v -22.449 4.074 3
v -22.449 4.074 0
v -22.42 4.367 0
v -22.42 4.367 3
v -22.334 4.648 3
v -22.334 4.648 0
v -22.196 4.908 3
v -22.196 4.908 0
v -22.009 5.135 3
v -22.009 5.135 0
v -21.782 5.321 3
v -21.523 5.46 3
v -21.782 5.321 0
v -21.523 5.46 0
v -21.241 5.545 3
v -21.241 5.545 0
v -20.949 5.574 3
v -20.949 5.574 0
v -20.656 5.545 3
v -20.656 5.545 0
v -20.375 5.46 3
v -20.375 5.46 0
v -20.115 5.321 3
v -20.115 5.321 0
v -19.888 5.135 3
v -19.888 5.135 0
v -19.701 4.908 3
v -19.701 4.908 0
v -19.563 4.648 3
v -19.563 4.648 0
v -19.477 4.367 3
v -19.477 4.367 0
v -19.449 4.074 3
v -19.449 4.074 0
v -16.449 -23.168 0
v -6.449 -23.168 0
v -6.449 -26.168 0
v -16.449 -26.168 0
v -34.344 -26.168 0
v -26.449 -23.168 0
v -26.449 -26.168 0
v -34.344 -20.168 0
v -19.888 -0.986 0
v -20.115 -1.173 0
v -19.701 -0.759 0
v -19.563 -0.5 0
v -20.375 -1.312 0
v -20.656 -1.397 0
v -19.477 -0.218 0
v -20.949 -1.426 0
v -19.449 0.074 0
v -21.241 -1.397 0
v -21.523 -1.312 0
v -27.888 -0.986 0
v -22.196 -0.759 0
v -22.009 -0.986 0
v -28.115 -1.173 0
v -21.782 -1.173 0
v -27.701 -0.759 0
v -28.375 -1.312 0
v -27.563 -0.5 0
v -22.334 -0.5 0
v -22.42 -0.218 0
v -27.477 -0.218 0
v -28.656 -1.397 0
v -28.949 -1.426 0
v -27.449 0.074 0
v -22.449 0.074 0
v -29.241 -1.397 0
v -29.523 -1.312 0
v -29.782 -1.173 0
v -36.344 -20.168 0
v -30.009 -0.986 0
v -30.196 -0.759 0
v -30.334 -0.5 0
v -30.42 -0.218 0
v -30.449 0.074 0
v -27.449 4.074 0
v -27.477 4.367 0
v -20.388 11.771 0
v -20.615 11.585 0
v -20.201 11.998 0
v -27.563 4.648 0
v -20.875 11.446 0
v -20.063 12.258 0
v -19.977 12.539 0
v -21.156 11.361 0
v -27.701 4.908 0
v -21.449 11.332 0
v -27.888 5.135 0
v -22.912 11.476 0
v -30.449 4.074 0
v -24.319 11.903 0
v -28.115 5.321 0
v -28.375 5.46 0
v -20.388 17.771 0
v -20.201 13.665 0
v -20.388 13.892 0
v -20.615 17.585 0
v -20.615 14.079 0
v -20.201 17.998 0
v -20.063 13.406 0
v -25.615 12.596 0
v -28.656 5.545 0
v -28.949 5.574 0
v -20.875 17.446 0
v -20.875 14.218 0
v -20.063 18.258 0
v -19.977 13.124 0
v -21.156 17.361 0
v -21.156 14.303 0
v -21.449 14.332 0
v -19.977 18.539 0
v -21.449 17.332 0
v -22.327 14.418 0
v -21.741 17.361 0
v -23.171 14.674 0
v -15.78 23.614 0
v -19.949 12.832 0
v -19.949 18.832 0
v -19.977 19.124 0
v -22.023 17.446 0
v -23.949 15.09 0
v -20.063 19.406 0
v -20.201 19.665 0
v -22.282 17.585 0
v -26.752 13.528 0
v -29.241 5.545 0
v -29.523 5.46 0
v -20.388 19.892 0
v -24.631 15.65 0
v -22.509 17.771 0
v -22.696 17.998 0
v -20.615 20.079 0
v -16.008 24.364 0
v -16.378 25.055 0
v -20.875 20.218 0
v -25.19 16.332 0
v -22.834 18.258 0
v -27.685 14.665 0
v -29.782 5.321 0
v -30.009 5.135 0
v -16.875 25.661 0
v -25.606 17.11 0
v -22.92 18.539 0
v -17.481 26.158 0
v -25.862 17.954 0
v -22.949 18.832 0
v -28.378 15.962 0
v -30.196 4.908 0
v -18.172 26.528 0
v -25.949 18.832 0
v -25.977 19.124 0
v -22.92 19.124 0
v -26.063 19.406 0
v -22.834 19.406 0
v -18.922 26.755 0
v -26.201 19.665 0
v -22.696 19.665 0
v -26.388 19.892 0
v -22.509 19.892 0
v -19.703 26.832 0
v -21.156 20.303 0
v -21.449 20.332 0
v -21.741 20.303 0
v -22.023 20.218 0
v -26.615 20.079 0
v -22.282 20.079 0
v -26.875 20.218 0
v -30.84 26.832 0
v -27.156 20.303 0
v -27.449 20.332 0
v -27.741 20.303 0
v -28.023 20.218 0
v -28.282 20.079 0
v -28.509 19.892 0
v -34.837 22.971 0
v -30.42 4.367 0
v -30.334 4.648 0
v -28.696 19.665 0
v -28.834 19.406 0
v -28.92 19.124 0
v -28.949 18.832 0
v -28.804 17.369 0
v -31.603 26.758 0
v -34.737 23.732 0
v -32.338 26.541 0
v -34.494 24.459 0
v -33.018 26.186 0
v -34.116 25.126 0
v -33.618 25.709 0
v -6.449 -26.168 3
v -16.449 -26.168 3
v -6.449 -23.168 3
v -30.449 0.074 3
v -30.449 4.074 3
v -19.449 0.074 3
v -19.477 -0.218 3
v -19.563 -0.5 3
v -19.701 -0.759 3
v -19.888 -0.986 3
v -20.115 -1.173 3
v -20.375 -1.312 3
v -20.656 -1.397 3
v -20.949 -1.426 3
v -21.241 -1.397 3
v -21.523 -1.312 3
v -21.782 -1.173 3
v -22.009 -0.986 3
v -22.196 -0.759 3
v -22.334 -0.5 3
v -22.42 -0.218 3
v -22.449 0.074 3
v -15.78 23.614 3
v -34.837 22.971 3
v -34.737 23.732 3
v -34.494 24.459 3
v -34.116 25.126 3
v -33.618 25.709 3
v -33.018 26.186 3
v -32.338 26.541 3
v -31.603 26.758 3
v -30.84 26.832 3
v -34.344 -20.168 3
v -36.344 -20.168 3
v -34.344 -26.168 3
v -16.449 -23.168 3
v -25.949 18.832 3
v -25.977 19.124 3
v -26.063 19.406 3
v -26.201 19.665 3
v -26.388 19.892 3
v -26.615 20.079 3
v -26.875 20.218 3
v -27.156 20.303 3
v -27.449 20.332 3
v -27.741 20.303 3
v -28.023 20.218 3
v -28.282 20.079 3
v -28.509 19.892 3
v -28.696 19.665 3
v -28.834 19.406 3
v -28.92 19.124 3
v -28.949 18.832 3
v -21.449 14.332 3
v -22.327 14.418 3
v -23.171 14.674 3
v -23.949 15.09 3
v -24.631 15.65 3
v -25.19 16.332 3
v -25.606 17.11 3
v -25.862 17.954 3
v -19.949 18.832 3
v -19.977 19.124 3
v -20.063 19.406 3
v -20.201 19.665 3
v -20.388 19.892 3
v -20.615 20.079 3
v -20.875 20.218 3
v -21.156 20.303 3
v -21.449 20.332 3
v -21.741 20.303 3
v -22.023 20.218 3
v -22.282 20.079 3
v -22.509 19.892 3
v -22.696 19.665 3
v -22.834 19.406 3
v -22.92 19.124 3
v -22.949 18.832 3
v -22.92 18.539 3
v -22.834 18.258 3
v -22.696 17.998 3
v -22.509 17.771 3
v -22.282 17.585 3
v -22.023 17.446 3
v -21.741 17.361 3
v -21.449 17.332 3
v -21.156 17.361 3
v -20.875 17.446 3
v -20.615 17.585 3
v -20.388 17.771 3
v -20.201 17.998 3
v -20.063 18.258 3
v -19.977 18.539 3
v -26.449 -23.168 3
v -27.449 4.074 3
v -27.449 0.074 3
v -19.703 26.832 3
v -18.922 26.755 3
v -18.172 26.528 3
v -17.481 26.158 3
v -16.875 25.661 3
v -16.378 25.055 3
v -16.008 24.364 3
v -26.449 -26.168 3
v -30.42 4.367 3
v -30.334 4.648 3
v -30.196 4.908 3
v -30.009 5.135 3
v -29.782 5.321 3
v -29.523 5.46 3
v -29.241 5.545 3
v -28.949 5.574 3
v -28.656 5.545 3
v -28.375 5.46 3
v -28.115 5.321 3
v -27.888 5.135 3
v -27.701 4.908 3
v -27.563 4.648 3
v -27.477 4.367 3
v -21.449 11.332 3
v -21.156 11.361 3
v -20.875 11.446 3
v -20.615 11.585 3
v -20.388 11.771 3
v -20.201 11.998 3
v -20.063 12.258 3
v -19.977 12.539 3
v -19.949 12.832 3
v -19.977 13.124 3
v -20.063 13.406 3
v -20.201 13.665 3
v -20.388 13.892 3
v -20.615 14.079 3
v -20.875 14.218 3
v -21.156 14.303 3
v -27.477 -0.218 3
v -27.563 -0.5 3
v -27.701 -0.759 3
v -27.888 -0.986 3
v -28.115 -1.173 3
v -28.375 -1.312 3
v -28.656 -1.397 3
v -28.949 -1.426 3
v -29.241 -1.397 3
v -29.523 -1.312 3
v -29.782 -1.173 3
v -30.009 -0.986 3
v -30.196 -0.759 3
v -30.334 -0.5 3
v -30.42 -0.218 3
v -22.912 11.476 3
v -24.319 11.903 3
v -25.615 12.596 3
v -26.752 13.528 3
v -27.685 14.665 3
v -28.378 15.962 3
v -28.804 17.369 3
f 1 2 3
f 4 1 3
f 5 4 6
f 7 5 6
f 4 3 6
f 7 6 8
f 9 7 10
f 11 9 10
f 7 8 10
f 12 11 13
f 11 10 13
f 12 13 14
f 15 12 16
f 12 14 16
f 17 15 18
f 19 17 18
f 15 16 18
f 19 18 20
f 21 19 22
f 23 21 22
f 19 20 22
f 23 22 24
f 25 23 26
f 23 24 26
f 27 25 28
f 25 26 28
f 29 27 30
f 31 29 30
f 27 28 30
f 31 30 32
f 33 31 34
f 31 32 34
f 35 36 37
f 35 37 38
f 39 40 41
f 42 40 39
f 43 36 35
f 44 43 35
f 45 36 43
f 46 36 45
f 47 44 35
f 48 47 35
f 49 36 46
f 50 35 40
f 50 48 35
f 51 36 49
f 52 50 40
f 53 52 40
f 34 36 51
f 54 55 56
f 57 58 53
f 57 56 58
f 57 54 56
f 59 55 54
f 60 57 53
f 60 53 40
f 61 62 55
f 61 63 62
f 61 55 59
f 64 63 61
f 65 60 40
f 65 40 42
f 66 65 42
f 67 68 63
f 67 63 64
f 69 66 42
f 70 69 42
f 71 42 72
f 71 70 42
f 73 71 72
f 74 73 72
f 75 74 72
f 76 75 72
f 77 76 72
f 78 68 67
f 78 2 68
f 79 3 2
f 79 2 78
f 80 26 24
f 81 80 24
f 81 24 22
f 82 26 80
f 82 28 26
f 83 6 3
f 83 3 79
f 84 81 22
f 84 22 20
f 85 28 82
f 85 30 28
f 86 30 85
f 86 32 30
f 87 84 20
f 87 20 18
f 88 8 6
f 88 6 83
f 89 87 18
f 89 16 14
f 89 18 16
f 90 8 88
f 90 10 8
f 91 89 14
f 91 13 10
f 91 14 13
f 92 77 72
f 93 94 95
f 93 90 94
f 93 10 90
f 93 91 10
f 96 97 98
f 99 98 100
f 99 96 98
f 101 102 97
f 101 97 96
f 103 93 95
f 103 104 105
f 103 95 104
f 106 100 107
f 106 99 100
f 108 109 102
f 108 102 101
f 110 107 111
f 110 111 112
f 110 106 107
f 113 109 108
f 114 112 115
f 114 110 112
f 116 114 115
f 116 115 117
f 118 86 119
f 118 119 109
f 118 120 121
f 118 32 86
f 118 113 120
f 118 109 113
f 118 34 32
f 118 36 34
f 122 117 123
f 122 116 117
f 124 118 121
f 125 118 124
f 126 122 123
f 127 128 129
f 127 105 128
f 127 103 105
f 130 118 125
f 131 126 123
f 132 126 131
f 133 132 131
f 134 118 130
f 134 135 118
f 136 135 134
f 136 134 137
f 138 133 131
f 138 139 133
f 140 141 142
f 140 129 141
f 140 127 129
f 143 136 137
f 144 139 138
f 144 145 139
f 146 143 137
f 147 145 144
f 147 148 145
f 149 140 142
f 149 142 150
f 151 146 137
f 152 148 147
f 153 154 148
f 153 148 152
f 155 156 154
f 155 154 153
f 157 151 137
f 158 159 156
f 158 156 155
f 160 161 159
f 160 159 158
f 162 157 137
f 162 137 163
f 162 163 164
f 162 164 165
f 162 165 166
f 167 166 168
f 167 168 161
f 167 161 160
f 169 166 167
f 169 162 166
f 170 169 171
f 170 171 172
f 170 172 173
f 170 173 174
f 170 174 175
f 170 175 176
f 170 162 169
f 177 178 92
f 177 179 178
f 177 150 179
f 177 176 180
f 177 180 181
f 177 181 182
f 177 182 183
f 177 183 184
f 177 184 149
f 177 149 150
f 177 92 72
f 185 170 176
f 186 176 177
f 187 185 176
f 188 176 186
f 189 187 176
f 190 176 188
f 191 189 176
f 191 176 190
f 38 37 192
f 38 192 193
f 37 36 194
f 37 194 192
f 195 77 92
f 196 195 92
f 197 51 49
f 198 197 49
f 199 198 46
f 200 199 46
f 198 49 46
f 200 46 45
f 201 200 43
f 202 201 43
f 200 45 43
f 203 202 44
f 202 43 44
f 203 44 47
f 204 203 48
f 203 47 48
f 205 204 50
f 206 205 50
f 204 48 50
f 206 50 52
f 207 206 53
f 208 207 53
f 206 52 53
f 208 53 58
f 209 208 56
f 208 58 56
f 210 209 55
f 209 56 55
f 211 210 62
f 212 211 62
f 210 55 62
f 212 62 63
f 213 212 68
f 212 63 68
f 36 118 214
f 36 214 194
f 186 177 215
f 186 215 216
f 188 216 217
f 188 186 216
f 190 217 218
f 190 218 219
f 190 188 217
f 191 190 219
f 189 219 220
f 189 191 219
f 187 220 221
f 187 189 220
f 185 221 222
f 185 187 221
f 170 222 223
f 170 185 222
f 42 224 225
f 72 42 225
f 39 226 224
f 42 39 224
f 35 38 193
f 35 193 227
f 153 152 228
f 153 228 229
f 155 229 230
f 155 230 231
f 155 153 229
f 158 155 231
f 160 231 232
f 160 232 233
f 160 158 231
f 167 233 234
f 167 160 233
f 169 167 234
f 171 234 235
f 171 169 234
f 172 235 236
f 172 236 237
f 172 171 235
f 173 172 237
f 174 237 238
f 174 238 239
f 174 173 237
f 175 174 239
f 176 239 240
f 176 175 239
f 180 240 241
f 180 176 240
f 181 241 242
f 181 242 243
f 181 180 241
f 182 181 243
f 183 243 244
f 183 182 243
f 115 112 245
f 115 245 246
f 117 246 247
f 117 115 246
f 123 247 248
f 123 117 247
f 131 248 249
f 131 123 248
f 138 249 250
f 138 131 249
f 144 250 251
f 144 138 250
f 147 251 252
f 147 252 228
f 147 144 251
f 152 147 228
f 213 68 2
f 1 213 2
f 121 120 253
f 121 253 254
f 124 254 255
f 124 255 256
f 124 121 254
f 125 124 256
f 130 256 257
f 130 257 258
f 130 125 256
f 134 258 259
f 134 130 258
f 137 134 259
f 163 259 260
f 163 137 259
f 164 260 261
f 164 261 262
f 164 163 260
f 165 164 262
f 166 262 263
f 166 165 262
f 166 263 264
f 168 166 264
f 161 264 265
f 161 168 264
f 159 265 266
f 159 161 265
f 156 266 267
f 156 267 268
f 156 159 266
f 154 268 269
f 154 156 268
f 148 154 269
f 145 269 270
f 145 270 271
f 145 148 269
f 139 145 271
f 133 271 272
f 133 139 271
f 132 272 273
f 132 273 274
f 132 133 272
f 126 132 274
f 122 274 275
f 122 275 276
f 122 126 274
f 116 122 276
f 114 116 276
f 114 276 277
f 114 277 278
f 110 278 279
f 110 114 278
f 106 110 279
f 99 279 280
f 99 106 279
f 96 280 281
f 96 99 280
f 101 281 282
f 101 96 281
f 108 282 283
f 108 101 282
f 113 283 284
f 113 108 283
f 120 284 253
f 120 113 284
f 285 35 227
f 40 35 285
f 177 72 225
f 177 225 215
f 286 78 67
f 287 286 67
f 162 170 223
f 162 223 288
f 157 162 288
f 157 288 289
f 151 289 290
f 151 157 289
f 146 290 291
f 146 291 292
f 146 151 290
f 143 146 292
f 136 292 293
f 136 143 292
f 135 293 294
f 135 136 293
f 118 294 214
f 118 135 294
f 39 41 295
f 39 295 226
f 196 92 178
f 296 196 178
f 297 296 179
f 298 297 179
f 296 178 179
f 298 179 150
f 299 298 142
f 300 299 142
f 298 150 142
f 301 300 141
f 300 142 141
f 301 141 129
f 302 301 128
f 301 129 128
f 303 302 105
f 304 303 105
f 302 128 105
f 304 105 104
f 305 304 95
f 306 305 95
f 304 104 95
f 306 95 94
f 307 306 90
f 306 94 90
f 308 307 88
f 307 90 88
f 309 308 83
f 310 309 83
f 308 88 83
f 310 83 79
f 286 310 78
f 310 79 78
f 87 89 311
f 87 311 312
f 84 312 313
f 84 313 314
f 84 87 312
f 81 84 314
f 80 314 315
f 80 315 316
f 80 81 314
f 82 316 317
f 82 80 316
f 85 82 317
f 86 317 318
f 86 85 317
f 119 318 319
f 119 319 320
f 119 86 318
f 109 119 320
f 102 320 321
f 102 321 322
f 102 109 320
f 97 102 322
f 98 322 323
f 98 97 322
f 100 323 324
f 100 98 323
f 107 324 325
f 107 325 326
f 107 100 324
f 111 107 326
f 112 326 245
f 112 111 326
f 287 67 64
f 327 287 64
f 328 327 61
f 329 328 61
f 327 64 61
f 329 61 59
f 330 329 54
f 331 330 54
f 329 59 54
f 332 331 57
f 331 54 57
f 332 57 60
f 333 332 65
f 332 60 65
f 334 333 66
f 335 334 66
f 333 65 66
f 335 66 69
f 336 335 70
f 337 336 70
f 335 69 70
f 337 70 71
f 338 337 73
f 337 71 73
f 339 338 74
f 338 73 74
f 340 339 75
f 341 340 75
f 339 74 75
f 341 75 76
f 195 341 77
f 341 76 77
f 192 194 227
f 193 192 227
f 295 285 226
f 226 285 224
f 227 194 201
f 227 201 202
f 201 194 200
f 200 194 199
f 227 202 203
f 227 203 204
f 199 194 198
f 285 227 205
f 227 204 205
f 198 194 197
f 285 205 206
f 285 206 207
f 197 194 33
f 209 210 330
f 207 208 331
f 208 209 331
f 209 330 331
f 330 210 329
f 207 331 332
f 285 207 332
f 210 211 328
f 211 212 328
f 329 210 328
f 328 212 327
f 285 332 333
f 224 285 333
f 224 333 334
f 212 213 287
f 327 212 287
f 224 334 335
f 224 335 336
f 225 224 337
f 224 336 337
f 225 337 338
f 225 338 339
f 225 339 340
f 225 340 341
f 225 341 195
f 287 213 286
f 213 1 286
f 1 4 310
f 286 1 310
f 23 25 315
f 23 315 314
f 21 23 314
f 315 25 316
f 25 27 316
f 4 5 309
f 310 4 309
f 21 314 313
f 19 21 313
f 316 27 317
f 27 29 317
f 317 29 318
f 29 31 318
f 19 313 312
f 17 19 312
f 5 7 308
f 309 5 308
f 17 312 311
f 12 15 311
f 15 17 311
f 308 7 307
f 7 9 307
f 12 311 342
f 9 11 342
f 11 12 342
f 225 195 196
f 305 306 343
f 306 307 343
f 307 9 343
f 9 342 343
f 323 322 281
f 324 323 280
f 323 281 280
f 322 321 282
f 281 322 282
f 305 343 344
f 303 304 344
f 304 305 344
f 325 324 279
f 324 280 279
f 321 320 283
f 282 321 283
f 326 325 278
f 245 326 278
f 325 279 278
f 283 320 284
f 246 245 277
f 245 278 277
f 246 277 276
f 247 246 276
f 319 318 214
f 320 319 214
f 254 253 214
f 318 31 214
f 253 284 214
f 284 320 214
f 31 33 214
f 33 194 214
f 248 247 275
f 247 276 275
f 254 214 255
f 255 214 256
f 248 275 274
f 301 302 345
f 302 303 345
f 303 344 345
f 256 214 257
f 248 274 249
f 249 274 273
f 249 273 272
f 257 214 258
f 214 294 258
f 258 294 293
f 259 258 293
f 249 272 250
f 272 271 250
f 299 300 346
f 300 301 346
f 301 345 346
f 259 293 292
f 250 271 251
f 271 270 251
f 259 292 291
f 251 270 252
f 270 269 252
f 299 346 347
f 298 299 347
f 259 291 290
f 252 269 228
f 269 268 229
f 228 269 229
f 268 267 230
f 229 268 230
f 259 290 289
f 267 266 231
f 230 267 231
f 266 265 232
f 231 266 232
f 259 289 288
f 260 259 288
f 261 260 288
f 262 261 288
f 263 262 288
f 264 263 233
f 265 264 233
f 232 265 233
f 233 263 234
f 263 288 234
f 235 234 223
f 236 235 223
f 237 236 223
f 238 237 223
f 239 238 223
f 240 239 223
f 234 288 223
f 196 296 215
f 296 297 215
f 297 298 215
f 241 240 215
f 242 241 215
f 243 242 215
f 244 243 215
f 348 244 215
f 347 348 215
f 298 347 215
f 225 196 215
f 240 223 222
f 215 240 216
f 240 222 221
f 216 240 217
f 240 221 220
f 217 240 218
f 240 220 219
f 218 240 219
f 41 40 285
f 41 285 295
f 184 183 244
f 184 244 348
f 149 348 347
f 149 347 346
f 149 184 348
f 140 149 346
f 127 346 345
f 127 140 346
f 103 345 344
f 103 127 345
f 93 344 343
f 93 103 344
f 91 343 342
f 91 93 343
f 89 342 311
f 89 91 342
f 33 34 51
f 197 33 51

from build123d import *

# Parameters (mm, degrees)
SKETCH1_R           = 1.5
BOSS_EXTRUDE1_DEPTH = 3
CUT_EXTRUDE1_DEPTH  = 4


with BuildPart() as part:
    # Sketch1 → Boss-Extrude1 (new body)
    with BuildSketch(Plane.XY):
        with BuildLine():
            Line((-36.448598131, -26.168224299), (-36.448598131, -23.168224299))
            Line((-36.448598131, -23.168224299), (-34.837367865, 22.971373688))
            ThreePointArc((-34.837367865, 22.971373688), (-33.618438039, 25.709134902), (-30.839804557, 26.831775701))
            Line((-30.839804557, 26.831775701), (-19.702559656, 26.831775701))
            ThreePointArc((-19.702559656, 26.831775701), (-17.165801235, 25.924485955), (-15.779830266, 23.614204058))
            Line((-15.779830266, 23.614204058), (-6.448598131, -23.168224299))
            Line((-6.448598131, -23.168224299), (-6.448598131, -26.168224299))
            Line((-6.448598131, -26.168224299), (-16.448598131, -26.168224299))
            Line((-16.448598131, -26.168224299), (-16.448598131, -23.168224299))
            Line((-16.448598131, -23.168224299), (-26.448598131, -23.168224299))
            Line((-26.448598131, -23.168224299), (-26.448598131, -26.168224299))
            Line((-26.448598131, -26.168224299), (-36.448598131, -26.168224299))
        make_face()
        with Locations((-21.448598131, 18.831775701)):
            Circle(SKETCH1_R, mode=Mode.SUBTRACT)
        with BuildLine():
            Line((-27.448598131, 4.074261176), (-27.448598131, 0.074261176))
            ThreePointArc((-27.448598131, 0.074261176), (-28.948598131, -1.425738824), (-30.448598131, 0.074261176))
            Line((-30.448598131, 0.074261176), (-30.448598131, 4.074261176))
            ThreePointArc((-30.448598131, 4.074261176), (-28.948598131, 5.574261176), (-27.448598131, 4.074261176))
        make_face(mode=Mode.SUBTRACT)
        with BuildLine():
            Line((-19.448598131, 4.074261176), (-19.448598131, 0.074261176))
            ThreePointArc((-19.448598131, 0.074261176), (-20.948598131, -1.425738824), (-22.448598131, 0.074261176))
            Line((-22.448598131, 0.074261176), (-22.448598131, 4.074261176))
            ThreePointArc((-22.448598131, 4.074261176), (-20.948598131, 5.574261176), (-19.448598131, 4.074261176))
        make_face(mode=Mode.SUBTRACT)
        with BuildLine():
            ThreePointArc((-28.948598131, 18.831775701), (-26.75189899, 13.528474842), (-21.448598131, 11.331775701))
            ThreePointArc((-21.448598131, 11.331775701), (-19.948598131, 12.831775701), (-21.448598131, 14.331775701))
            ThreePointArc((-21.448598131, 14.331775701), (-24.630578646, 15.649795186), (-25.948598131, 18.831775701))
            ThreePointArc((-25.948598131, 18.831775701), (-27.448598131, 20.331775701), (-28.948598131, 18.831775701))
        make_face(mode=Mode.SUBTRACT)
    extrude(amount=BOSS_EXTRUDE1_DEPTH)

    # Sketch2 → Cut-Extrude1 (cut, through all)
    with BuildSketch(Plane.XY.offset(3)):
        Polygon((-34.343835822, -26.168224299), (-34.343835822, -20.168224299), (-36.343835822, -20.168224299), (-36.448598131, -23.168224299), (-36.448598131, -26.168224299), align=None)
    extrude(amount=-CUT_EXTRUDE1_DEPTH, mode=Mode.SUBTRACT)


solid = part.part
